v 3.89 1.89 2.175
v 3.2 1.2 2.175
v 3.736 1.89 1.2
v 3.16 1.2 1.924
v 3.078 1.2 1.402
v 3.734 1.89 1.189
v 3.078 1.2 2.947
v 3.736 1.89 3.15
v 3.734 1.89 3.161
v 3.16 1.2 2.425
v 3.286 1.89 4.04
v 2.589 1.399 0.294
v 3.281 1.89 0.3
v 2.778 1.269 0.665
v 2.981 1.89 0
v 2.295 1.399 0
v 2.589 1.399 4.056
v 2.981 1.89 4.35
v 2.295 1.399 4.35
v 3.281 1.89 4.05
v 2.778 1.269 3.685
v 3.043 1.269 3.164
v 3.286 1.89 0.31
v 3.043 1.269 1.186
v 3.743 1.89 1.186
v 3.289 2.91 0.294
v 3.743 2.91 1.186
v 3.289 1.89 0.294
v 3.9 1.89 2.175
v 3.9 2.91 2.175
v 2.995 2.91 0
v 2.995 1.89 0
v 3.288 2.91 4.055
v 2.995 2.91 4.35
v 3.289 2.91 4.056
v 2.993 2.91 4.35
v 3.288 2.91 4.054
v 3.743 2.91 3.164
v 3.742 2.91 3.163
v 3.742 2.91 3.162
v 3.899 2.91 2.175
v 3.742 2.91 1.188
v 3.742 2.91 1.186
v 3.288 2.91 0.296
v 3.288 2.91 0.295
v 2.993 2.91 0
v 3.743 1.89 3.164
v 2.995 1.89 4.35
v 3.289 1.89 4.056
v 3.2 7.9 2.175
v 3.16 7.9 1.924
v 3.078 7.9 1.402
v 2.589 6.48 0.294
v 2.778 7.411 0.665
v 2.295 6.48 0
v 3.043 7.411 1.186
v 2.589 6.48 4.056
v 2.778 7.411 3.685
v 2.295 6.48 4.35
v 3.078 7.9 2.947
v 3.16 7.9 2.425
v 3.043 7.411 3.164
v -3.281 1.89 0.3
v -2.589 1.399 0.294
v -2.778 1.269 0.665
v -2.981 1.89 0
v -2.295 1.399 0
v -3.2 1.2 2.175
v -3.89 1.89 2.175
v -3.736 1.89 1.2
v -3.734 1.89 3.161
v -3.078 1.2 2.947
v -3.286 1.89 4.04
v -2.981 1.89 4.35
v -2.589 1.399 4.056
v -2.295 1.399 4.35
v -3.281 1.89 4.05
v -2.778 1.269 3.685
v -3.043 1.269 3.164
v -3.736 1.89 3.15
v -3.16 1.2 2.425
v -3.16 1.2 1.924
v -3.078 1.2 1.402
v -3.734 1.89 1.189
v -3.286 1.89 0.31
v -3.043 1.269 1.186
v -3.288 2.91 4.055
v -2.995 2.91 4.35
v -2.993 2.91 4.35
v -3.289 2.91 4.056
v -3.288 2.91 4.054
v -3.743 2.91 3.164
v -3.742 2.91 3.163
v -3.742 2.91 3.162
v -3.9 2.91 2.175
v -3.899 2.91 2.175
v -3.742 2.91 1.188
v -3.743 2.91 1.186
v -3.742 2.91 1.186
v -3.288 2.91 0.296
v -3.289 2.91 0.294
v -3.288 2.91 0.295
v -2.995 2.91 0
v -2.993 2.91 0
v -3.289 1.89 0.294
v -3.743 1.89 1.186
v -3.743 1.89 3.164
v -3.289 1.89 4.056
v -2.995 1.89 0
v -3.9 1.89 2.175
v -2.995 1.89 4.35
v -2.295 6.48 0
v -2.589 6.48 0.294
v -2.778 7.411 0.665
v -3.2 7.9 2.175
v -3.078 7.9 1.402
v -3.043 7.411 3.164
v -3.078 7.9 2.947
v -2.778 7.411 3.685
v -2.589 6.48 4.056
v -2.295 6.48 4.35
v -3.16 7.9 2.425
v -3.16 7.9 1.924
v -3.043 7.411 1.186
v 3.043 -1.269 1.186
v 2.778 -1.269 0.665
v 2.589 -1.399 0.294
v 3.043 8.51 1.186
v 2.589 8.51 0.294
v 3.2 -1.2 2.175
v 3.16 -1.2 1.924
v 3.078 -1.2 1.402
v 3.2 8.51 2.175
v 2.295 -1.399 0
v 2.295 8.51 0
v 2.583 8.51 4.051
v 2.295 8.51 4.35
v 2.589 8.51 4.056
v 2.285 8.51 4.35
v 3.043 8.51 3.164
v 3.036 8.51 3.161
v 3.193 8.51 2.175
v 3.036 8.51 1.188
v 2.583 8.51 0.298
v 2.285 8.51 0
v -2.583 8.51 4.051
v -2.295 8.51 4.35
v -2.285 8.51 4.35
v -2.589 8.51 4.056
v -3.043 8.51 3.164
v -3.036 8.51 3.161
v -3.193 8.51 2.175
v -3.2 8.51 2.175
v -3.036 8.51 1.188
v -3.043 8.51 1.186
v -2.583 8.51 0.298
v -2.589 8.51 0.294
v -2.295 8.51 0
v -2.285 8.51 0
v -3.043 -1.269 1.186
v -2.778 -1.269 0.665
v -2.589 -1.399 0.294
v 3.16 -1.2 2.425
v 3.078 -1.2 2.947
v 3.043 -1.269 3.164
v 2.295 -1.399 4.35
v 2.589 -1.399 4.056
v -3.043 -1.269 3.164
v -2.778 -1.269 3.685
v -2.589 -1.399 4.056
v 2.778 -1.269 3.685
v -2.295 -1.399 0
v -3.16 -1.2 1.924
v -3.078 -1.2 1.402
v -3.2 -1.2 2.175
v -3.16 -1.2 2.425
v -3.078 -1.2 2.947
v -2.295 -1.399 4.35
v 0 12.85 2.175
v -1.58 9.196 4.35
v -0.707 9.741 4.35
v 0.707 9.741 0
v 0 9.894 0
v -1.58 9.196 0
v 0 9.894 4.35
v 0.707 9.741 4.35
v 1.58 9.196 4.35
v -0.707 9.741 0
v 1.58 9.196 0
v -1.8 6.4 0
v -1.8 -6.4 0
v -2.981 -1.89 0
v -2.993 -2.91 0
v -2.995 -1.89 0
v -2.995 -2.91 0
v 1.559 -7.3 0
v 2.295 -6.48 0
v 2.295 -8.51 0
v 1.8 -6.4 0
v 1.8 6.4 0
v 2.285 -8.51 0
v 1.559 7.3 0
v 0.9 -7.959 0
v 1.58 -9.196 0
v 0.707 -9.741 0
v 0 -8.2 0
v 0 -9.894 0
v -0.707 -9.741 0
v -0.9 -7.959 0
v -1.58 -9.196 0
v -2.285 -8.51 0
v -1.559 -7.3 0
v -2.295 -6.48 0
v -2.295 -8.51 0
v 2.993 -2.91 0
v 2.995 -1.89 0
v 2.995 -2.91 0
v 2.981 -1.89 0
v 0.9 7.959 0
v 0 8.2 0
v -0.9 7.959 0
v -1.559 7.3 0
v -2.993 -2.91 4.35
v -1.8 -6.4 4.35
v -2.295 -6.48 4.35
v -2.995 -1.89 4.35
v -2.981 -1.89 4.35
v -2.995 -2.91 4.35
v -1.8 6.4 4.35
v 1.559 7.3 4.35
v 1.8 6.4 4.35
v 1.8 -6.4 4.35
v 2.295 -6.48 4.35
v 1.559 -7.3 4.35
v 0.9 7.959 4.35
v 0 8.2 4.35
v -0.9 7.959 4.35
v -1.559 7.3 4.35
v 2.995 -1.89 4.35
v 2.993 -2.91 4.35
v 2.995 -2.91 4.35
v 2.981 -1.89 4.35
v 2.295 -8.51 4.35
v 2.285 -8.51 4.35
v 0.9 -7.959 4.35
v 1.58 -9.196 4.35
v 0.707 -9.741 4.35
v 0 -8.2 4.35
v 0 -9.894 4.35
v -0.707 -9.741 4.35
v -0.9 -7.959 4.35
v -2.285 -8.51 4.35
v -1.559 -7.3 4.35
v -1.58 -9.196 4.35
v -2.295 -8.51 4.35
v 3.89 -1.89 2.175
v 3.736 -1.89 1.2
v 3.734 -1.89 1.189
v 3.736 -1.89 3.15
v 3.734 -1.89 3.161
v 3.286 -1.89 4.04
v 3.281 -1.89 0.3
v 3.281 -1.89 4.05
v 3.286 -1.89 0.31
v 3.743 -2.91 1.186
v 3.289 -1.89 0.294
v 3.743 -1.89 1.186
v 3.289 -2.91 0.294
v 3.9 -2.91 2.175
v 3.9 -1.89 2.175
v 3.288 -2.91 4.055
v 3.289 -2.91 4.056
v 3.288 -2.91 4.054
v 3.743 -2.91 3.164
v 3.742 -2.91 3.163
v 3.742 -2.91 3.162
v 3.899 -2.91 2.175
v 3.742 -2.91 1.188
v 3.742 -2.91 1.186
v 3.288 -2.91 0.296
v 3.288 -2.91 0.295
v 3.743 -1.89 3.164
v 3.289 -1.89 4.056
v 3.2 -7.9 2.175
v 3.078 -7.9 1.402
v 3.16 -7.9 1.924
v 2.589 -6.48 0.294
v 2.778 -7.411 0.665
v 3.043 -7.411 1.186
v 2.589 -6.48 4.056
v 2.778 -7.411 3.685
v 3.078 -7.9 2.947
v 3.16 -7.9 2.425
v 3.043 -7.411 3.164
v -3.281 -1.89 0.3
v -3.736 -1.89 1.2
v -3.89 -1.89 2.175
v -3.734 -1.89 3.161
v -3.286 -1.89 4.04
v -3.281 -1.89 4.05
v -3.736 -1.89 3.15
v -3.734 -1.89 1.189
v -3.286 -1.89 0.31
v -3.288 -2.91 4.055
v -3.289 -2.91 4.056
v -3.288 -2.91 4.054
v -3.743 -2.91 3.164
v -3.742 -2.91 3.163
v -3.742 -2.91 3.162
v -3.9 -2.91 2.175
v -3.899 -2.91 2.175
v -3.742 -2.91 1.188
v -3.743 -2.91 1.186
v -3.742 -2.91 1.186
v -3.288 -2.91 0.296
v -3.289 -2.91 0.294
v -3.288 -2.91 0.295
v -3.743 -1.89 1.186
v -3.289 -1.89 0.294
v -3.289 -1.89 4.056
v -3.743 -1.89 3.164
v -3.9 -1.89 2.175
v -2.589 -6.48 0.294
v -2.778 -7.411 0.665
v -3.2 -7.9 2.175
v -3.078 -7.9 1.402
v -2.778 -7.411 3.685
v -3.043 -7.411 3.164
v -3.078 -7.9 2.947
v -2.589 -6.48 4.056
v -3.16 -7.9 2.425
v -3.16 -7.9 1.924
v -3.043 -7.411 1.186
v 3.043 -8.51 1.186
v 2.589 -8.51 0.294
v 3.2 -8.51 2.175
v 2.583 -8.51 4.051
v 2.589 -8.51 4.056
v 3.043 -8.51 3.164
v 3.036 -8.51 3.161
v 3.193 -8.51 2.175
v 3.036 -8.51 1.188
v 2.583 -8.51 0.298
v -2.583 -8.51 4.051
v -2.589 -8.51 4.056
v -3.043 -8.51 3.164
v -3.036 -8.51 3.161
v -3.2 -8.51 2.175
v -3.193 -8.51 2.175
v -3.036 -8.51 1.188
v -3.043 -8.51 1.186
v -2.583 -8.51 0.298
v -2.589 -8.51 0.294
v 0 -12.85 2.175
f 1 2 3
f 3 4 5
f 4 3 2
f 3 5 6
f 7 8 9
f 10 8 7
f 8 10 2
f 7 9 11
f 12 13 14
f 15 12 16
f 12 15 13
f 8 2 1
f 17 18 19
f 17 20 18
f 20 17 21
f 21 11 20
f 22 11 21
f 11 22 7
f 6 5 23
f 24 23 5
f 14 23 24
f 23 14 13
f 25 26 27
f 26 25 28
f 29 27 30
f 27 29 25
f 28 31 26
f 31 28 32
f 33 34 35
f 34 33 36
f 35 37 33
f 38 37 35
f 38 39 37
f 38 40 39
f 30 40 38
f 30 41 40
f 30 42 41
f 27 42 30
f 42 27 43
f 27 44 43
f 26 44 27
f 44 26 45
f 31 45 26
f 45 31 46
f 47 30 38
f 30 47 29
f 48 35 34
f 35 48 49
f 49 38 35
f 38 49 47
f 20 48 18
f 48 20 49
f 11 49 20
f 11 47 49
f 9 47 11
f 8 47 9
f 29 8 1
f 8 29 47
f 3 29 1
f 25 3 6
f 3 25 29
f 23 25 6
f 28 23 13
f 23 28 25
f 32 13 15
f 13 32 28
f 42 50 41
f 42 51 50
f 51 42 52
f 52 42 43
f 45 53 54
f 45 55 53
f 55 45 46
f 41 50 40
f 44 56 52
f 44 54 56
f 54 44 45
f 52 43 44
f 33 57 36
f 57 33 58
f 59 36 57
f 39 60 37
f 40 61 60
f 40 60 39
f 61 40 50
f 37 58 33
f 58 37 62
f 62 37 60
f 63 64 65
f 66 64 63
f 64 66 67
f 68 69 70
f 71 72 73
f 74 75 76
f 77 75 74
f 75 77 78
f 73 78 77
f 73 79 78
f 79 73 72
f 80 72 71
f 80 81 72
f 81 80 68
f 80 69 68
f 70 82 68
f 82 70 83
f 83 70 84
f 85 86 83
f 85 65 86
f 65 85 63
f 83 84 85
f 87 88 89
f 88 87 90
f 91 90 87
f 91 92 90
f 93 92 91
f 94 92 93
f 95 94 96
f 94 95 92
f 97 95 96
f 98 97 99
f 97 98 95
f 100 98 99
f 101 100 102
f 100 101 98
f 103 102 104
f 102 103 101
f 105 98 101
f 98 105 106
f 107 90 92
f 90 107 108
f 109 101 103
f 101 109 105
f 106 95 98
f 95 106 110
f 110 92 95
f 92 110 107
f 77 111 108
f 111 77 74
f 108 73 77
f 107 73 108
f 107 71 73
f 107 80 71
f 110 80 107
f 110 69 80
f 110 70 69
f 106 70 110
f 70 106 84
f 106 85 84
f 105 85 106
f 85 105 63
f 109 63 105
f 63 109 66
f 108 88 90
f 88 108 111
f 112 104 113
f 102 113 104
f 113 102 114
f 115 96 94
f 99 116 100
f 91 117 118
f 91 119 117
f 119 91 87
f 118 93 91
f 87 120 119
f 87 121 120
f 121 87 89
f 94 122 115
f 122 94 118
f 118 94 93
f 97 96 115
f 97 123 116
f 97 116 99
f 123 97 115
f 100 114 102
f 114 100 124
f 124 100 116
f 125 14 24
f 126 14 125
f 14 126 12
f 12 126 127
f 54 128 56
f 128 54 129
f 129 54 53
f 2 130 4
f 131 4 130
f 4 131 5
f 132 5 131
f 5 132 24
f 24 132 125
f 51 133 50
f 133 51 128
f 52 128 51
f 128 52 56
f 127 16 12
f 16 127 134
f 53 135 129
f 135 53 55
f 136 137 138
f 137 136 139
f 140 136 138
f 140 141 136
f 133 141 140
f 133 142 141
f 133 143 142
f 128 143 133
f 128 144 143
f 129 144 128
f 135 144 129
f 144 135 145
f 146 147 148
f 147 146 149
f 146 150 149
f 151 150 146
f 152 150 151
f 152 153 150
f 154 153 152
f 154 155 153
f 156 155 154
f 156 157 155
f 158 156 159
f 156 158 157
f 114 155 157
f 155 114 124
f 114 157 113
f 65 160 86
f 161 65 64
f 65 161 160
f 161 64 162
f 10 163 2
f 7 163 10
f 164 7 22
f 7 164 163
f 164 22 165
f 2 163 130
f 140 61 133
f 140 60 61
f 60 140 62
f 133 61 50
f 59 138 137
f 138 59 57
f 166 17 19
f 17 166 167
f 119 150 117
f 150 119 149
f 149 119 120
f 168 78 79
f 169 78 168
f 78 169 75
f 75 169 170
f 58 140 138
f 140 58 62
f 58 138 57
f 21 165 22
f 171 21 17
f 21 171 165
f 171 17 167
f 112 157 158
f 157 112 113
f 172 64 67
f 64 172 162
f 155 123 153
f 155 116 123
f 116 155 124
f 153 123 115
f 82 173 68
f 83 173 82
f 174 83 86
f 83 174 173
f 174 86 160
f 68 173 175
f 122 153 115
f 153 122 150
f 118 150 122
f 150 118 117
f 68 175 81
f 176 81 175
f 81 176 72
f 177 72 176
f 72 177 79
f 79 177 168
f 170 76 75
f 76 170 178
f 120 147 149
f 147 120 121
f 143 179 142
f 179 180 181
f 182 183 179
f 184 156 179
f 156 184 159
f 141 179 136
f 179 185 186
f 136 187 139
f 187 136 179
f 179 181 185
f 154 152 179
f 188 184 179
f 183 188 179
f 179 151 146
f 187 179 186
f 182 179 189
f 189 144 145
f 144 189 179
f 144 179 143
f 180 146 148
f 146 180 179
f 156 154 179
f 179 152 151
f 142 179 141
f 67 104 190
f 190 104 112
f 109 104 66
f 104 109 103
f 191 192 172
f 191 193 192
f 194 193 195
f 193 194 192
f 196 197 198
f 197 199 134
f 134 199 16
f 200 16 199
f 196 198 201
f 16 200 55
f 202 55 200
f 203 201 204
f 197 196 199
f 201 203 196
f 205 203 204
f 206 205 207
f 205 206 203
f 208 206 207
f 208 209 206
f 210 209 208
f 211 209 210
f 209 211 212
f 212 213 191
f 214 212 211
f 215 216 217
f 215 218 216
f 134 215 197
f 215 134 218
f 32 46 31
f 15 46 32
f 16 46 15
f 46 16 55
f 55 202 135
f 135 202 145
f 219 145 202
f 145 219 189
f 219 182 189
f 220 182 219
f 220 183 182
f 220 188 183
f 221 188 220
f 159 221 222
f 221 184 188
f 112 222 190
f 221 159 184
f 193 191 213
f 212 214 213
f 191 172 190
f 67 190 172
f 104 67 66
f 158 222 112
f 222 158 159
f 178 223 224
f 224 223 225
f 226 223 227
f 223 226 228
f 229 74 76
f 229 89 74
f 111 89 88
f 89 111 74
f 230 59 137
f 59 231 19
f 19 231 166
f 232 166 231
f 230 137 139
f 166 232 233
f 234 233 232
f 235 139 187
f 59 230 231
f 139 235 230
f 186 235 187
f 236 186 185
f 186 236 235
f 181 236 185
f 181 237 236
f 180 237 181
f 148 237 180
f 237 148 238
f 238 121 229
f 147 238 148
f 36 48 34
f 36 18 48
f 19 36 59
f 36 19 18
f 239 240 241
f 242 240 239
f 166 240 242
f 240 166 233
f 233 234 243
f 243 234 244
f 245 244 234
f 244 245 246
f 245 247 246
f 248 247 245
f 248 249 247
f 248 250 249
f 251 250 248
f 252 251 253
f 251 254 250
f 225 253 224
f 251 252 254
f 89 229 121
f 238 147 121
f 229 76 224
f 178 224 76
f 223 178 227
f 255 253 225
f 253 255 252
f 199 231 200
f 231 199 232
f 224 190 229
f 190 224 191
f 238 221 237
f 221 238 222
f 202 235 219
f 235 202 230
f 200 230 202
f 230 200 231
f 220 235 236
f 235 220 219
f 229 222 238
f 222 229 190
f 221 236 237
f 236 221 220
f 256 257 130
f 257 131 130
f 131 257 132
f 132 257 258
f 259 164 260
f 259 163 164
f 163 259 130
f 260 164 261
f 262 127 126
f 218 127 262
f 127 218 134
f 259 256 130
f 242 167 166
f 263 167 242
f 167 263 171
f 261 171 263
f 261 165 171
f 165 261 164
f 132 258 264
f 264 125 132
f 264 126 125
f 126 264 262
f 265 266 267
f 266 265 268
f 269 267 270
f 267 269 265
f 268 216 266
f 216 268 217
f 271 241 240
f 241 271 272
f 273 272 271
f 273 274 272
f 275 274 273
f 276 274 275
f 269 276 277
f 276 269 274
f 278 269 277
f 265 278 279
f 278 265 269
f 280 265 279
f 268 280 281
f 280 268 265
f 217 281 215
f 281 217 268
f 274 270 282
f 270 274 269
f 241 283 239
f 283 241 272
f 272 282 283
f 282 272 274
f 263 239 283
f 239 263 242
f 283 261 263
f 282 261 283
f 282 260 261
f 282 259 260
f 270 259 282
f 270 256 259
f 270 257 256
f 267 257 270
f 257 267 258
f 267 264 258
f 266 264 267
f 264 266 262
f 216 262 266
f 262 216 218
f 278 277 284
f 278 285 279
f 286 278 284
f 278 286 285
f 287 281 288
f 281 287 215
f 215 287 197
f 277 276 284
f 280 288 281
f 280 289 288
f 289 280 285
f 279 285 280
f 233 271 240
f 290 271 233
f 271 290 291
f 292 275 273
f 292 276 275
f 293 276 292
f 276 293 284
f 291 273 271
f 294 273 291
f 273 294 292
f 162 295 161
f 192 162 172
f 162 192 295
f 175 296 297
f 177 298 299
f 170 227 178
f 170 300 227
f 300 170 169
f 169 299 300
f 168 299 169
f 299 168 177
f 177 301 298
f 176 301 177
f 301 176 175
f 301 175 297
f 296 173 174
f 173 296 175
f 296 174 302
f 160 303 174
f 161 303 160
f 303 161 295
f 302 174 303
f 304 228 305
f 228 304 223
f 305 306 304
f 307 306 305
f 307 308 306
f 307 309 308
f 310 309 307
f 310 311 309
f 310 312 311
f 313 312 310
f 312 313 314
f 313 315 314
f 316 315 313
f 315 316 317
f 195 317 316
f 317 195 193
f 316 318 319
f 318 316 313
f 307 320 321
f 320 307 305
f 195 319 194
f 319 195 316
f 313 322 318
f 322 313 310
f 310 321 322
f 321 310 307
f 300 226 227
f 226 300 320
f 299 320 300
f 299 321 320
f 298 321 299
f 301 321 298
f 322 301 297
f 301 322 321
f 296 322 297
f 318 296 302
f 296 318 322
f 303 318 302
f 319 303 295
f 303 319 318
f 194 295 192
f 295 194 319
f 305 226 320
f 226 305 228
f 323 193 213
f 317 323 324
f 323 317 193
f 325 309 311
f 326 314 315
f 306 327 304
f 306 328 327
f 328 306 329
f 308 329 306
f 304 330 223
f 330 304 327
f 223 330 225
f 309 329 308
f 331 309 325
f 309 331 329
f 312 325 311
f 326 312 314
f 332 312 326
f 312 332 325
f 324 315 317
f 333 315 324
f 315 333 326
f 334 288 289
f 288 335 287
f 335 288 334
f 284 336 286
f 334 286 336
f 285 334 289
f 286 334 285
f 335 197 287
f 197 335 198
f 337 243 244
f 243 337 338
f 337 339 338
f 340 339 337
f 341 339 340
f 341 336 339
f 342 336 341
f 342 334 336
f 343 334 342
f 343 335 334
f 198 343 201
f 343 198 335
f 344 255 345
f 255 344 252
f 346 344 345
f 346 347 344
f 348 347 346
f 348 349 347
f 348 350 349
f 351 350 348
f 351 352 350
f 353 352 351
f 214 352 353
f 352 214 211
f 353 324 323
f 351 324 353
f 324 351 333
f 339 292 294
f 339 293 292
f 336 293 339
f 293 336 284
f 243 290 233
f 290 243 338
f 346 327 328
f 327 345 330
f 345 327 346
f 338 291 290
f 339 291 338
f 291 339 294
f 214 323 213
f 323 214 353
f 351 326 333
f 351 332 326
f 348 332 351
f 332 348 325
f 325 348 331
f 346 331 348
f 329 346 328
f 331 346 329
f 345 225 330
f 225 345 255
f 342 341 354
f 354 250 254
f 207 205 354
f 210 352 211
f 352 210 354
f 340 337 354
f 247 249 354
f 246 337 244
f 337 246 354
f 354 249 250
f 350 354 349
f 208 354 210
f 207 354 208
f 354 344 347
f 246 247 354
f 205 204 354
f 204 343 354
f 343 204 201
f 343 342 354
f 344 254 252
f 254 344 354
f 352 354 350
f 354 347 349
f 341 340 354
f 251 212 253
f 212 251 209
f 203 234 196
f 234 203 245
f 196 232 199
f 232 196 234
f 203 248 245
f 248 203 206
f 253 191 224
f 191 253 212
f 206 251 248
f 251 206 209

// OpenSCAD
// new pin connectors

object=0;//[0:Pinpeg,1:Pinhole]
//Pinpeg is twice this length
length=13;
//Of hole; pinpeg is smaller to fit
diameter=7;
//Only affects pinhole
hole_twist=0;//[0:free,1:fixed]
//Pulls the snaps together on the pinpeg to ensure a tight coupling
preload=0.1;
//Allows pins to fit easily into holes
clearance=0.3;
//Thicker makes the pinpeg stiffer
thickness=1.4;  // default: 1.8
//Height of snap nubs
snap=0.4;
//Put fins on pinhole to help with printing strength
fins=1;//[1:yes,0:no]

$fn=20;

if(object==0)pinpeg(r=diameter/2,l=length,d=2.5-preload,nub=snap,t=thickness,space=clearance);
if(object==1)pinhole(r=diameter/2,l=length,nub=snap,fixed=hole_twist,fins=fins);

//pin(flat=0);
//%pinhole(fixed=true);

//pinpeg();
//translate([10,0,0])difference(){
//	cylinder(r=5.5,h=14);
//	pinhole(fixed=true);
//}
//translate([-10,0,0])difference(){
//	cylinder(r=5.5,h=14);
//	pinhole(fixed=false);
//}

module pin(r=3.5,l=13,d=2.4,slot=10,nub=0.4,t=1.8,space=0.3,flat=1)
translate(flat*[0,0,r/sqrt(2)-space])rotate((1-flat)*[90,0,0])
difference(){
	rotate([-90,0,0])intersection(){
		union(){
			translate([0,0,-0.01])cylinder(r=r-space,h=l-r-0.98);
			translate([0,0,l-r-1])cylinder(r1=r-space,r2=0,h=r-space/2+1);
			translate([nub+space,0,d])nub(r-space,nub+space);
			translate([-nub-space,0,d])nub(r-space,nub+space);
		}
		cube([3*r,r*sqrt(2)-2*space,2*l+3*r],center=true);
	}
	translate([0,d,0])cube([2*(r-t-space),slot,2*r],center=true);
	translate([0,d-slot/2,0])cylinder(r=r-t-space,h=2*r,center=true,$fn=12);
	translate([0,d+slot/2,0])cylinder(r=r-t-space,h=2*r,center=true,$fn=12);
}

module nub(r,nub)
union(){
	translate([0,0,-nub-0.5])cylinder(r1=r-nub,r2=r,h=nub);
	cylinder(r=r,h=1.02,center=true);
	translate([0,0,0.5])cylinder(r1=r,r2=r-nub,h=5);
}

module pinhole(r=3.5,l=13,d=2.5,nub=0.4,fixed=false,fins=true)
intersection(){
	union(){
		translate([0,0,-0.1])cylinder(r=r,h=l-r+0.1);
		translate([0,0,l-r-0.01])cylinder(r1=r,r2=0,h=r);
		translate([0,0,d])nub(r+nub,nub);
		if(fins)translate([0,0,l-r]){
			cube([2*r,0.01,2*r],center=true);
			cube([0.01,2*r,2*r],center=true);
		}
	}
	if(fixed)cube([3*r,r*sqrt(2),2*l+3*r],center=true);
}

module pinpeg(r=3.5,l=13,d=2.4,nub=0.4,t=1.8,space=0.3)
union(){
	pin(r=r,l=l,d=d,nub=nub,t=t,space=space,flat=1, slot=8);
	mirror([0,1,0])pin(r=r,l=l,d=d,nub=nub,t=t,space=space,flat=1, slot=8);
}
